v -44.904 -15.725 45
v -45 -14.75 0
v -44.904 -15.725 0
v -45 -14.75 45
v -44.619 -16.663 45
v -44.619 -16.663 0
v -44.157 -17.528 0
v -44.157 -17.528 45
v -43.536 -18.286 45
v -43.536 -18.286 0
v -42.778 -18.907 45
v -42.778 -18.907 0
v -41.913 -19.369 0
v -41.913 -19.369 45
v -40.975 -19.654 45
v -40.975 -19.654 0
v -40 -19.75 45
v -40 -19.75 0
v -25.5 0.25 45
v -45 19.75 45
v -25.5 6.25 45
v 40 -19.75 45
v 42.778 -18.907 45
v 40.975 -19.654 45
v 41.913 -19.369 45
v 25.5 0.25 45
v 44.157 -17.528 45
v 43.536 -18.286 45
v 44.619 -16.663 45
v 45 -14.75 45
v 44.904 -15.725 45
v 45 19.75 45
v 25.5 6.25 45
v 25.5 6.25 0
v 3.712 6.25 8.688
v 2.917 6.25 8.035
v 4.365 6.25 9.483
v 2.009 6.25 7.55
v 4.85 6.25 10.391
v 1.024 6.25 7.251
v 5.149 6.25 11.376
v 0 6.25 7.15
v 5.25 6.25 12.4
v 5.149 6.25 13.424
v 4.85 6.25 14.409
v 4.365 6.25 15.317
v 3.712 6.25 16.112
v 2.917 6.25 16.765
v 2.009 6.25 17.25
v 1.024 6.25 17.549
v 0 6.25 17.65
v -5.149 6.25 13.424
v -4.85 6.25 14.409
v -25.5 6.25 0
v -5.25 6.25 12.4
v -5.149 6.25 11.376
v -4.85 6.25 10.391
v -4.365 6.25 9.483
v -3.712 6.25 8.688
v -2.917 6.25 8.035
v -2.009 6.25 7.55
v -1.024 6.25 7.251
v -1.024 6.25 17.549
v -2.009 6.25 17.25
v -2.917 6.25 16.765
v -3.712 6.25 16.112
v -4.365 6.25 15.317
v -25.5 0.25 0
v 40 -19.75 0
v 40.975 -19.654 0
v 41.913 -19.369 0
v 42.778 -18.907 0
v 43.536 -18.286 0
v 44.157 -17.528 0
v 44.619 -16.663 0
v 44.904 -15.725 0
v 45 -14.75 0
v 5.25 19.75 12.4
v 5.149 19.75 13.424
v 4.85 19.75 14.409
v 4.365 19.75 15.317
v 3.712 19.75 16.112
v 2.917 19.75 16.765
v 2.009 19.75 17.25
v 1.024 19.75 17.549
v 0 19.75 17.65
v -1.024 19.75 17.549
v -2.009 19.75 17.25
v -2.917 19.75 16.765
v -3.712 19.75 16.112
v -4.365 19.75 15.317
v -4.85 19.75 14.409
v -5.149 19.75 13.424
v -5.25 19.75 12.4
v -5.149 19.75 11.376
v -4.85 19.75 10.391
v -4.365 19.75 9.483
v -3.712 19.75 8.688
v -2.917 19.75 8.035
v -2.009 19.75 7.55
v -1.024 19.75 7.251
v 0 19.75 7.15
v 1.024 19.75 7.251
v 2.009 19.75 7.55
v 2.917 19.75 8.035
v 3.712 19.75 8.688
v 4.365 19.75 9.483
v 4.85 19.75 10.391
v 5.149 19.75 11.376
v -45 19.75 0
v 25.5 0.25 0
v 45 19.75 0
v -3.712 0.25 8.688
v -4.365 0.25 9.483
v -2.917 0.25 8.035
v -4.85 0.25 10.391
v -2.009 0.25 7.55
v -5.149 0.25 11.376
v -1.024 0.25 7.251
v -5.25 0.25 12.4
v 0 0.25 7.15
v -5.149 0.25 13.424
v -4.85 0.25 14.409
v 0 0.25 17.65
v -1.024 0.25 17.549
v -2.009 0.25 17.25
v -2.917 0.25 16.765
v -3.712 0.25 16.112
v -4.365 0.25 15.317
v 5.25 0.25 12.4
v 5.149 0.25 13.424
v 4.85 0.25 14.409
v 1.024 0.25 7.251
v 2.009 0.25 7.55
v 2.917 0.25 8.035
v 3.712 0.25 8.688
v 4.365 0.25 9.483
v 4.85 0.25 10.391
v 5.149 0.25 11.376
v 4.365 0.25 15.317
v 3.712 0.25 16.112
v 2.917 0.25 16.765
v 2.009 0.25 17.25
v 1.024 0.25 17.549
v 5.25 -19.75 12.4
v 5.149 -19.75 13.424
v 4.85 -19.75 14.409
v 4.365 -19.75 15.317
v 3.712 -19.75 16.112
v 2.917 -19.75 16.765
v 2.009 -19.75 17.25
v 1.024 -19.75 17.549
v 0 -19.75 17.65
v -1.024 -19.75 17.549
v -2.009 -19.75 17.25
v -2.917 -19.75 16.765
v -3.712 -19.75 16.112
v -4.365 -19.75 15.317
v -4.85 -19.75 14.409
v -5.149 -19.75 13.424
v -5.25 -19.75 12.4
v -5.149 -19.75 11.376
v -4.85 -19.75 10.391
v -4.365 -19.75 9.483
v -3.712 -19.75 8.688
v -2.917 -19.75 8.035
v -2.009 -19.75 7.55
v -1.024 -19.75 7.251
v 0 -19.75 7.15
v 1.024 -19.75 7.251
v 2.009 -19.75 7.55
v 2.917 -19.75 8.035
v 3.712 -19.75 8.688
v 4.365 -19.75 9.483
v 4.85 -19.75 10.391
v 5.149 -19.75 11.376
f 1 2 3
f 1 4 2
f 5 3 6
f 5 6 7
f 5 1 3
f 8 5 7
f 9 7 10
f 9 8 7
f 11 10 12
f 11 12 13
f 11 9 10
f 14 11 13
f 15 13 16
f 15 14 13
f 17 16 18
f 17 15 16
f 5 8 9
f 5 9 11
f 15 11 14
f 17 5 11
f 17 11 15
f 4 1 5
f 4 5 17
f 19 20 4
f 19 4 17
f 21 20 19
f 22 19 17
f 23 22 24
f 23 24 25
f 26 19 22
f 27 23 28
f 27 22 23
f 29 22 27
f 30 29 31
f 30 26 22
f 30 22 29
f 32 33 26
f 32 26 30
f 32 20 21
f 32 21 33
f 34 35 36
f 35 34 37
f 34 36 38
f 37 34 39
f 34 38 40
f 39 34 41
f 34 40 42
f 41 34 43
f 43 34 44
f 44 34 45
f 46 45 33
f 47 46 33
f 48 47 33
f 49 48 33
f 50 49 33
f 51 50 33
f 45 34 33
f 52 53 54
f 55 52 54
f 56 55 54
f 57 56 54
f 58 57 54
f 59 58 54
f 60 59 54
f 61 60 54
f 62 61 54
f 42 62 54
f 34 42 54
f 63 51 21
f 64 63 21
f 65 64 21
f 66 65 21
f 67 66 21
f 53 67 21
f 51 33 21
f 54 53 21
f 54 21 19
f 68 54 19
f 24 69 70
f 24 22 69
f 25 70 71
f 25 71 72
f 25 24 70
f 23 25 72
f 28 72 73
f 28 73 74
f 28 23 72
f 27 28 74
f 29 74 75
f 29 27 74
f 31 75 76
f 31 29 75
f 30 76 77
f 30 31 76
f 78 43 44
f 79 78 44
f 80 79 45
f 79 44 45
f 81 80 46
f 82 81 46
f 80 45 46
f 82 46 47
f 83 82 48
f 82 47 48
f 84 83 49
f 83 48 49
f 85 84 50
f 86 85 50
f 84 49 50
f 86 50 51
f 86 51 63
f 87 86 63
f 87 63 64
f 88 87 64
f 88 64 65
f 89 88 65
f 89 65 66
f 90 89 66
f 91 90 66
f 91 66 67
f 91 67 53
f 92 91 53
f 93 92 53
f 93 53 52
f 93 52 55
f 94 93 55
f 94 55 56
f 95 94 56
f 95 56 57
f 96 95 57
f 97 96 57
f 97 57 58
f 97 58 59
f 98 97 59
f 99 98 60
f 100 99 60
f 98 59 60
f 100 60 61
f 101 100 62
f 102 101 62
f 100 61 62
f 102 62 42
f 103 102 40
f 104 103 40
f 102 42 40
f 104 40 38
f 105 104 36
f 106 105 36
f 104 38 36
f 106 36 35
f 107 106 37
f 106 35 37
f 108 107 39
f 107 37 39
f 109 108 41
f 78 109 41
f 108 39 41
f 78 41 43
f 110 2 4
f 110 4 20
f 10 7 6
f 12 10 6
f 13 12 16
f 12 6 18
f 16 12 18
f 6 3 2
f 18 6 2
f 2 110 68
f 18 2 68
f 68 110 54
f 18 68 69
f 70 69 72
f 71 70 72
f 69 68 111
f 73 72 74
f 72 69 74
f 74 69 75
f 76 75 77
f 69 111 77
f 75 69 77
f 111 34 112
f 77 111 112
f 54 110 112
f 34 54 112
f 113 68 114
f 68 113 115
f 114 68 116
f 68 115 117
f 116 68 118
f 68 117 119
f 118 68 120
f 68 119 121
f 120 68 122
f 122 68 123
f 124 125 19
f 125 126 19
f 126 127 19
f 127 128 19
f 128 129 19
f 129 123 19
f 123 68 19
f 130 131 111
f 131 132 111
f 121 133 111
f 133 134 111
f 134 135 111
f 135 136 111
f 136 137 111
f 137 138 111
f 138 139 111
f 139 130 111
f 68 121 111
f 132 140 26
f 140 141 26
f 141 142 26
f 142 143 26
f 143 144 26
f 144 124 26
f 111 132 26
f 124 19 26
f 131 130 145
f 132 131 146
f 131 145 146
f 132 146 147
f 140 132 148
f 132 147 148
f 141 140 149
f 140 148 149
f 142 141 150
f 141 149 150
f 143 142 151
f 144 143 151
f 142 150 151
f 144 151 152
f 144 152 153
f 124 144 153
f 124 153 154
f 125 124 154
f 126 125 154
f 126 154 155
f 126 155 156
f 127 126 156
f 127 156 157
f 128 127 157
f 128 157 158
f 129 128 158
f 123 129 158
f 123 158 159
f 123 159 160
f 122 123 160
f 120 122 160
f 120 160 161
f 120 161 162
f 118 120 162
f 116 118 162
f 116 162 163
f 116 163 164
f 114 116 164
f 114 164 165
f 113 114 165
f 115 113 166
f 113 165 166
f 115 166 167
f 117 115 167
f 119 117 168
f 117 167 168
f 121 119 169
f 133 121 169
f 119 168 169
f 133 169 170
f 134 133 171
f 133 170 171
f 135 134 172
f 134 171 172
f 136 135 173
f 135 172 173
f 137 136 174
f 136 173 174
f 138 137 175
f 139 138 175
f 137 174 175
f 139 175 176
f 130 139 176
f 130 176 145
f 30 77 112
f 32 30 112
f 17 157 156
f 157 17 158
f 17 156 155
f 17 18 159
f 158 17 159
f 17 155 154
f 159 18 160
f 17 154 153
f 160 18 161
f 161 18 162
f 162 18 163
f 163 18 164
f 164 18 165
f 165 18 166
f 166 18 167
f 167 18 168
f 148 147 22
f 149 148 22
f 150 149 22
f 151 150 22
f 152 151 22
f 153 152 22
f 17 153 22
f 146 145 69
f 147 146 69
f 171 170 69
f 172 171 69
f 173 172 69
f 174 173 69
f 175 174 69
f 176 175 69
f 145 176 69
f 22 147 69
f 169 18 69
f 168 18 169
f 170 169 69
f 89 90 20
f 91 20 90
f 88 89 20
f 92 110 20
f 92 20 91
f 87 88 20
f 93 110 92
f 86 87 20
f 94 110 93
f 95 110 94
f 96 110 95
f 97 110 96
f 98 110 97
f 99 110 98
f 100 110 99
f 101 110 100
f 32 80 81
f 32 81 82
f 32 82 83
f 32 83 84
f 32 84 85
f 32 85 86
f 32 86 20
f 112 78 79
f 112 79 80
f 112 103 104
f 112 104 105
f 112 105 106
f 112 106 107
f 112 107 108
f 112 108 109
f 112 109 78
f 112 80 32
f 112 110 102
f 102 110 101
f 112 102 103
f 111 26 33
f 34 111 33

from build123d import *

# Parameters (mm, degrees)
F0_W     = 90
F0_H     = 39.5
F1_DEPTH = 45
F2_R     = 5.25
F3_DEPTH = 39.5
F5_DEPTH = 45.001
F6_R     = 5


with BuildPart() as f1:
    # F0 (on Top) → F1 (new body)
    with BuildSketch(Plane.XY):
        Rectangle(F0_W, F0_H)
    extrude(amount=F1_DEPTH)

    # F2 (on face) → F3 (cut, through all)
    with BuildSketch(Plane.XZ.offset(19.75)):
        with Locations((0, 12.4)):
            Circle(F2_R)
    extrude(amount=-F3_DEPTH, mode=Mode.SUBTRACT)

    # F4 (on face) → F5 (cut, through all)
    with BuildSketch(Plane.XY.offset(45)):
        Polygon((25.5, 6.25), (0, 6.25), (-25.5, 6.25), (-25.5, 0.25), (0, 0.25), (25.5, 0.25), align=None)
    extrude(amount=-F5_DEPTH, mode=Mode.SUBTRACT)

    # F6
    f6_edges = [f1.edges().sort_by_distance(p)[0] for p in [
        (-45, -19.75, 22.5),
        (45, -19.75, 22.5),
    ]]
    fillet(f6_edges, radius=F6_R)


solid = f1.part
